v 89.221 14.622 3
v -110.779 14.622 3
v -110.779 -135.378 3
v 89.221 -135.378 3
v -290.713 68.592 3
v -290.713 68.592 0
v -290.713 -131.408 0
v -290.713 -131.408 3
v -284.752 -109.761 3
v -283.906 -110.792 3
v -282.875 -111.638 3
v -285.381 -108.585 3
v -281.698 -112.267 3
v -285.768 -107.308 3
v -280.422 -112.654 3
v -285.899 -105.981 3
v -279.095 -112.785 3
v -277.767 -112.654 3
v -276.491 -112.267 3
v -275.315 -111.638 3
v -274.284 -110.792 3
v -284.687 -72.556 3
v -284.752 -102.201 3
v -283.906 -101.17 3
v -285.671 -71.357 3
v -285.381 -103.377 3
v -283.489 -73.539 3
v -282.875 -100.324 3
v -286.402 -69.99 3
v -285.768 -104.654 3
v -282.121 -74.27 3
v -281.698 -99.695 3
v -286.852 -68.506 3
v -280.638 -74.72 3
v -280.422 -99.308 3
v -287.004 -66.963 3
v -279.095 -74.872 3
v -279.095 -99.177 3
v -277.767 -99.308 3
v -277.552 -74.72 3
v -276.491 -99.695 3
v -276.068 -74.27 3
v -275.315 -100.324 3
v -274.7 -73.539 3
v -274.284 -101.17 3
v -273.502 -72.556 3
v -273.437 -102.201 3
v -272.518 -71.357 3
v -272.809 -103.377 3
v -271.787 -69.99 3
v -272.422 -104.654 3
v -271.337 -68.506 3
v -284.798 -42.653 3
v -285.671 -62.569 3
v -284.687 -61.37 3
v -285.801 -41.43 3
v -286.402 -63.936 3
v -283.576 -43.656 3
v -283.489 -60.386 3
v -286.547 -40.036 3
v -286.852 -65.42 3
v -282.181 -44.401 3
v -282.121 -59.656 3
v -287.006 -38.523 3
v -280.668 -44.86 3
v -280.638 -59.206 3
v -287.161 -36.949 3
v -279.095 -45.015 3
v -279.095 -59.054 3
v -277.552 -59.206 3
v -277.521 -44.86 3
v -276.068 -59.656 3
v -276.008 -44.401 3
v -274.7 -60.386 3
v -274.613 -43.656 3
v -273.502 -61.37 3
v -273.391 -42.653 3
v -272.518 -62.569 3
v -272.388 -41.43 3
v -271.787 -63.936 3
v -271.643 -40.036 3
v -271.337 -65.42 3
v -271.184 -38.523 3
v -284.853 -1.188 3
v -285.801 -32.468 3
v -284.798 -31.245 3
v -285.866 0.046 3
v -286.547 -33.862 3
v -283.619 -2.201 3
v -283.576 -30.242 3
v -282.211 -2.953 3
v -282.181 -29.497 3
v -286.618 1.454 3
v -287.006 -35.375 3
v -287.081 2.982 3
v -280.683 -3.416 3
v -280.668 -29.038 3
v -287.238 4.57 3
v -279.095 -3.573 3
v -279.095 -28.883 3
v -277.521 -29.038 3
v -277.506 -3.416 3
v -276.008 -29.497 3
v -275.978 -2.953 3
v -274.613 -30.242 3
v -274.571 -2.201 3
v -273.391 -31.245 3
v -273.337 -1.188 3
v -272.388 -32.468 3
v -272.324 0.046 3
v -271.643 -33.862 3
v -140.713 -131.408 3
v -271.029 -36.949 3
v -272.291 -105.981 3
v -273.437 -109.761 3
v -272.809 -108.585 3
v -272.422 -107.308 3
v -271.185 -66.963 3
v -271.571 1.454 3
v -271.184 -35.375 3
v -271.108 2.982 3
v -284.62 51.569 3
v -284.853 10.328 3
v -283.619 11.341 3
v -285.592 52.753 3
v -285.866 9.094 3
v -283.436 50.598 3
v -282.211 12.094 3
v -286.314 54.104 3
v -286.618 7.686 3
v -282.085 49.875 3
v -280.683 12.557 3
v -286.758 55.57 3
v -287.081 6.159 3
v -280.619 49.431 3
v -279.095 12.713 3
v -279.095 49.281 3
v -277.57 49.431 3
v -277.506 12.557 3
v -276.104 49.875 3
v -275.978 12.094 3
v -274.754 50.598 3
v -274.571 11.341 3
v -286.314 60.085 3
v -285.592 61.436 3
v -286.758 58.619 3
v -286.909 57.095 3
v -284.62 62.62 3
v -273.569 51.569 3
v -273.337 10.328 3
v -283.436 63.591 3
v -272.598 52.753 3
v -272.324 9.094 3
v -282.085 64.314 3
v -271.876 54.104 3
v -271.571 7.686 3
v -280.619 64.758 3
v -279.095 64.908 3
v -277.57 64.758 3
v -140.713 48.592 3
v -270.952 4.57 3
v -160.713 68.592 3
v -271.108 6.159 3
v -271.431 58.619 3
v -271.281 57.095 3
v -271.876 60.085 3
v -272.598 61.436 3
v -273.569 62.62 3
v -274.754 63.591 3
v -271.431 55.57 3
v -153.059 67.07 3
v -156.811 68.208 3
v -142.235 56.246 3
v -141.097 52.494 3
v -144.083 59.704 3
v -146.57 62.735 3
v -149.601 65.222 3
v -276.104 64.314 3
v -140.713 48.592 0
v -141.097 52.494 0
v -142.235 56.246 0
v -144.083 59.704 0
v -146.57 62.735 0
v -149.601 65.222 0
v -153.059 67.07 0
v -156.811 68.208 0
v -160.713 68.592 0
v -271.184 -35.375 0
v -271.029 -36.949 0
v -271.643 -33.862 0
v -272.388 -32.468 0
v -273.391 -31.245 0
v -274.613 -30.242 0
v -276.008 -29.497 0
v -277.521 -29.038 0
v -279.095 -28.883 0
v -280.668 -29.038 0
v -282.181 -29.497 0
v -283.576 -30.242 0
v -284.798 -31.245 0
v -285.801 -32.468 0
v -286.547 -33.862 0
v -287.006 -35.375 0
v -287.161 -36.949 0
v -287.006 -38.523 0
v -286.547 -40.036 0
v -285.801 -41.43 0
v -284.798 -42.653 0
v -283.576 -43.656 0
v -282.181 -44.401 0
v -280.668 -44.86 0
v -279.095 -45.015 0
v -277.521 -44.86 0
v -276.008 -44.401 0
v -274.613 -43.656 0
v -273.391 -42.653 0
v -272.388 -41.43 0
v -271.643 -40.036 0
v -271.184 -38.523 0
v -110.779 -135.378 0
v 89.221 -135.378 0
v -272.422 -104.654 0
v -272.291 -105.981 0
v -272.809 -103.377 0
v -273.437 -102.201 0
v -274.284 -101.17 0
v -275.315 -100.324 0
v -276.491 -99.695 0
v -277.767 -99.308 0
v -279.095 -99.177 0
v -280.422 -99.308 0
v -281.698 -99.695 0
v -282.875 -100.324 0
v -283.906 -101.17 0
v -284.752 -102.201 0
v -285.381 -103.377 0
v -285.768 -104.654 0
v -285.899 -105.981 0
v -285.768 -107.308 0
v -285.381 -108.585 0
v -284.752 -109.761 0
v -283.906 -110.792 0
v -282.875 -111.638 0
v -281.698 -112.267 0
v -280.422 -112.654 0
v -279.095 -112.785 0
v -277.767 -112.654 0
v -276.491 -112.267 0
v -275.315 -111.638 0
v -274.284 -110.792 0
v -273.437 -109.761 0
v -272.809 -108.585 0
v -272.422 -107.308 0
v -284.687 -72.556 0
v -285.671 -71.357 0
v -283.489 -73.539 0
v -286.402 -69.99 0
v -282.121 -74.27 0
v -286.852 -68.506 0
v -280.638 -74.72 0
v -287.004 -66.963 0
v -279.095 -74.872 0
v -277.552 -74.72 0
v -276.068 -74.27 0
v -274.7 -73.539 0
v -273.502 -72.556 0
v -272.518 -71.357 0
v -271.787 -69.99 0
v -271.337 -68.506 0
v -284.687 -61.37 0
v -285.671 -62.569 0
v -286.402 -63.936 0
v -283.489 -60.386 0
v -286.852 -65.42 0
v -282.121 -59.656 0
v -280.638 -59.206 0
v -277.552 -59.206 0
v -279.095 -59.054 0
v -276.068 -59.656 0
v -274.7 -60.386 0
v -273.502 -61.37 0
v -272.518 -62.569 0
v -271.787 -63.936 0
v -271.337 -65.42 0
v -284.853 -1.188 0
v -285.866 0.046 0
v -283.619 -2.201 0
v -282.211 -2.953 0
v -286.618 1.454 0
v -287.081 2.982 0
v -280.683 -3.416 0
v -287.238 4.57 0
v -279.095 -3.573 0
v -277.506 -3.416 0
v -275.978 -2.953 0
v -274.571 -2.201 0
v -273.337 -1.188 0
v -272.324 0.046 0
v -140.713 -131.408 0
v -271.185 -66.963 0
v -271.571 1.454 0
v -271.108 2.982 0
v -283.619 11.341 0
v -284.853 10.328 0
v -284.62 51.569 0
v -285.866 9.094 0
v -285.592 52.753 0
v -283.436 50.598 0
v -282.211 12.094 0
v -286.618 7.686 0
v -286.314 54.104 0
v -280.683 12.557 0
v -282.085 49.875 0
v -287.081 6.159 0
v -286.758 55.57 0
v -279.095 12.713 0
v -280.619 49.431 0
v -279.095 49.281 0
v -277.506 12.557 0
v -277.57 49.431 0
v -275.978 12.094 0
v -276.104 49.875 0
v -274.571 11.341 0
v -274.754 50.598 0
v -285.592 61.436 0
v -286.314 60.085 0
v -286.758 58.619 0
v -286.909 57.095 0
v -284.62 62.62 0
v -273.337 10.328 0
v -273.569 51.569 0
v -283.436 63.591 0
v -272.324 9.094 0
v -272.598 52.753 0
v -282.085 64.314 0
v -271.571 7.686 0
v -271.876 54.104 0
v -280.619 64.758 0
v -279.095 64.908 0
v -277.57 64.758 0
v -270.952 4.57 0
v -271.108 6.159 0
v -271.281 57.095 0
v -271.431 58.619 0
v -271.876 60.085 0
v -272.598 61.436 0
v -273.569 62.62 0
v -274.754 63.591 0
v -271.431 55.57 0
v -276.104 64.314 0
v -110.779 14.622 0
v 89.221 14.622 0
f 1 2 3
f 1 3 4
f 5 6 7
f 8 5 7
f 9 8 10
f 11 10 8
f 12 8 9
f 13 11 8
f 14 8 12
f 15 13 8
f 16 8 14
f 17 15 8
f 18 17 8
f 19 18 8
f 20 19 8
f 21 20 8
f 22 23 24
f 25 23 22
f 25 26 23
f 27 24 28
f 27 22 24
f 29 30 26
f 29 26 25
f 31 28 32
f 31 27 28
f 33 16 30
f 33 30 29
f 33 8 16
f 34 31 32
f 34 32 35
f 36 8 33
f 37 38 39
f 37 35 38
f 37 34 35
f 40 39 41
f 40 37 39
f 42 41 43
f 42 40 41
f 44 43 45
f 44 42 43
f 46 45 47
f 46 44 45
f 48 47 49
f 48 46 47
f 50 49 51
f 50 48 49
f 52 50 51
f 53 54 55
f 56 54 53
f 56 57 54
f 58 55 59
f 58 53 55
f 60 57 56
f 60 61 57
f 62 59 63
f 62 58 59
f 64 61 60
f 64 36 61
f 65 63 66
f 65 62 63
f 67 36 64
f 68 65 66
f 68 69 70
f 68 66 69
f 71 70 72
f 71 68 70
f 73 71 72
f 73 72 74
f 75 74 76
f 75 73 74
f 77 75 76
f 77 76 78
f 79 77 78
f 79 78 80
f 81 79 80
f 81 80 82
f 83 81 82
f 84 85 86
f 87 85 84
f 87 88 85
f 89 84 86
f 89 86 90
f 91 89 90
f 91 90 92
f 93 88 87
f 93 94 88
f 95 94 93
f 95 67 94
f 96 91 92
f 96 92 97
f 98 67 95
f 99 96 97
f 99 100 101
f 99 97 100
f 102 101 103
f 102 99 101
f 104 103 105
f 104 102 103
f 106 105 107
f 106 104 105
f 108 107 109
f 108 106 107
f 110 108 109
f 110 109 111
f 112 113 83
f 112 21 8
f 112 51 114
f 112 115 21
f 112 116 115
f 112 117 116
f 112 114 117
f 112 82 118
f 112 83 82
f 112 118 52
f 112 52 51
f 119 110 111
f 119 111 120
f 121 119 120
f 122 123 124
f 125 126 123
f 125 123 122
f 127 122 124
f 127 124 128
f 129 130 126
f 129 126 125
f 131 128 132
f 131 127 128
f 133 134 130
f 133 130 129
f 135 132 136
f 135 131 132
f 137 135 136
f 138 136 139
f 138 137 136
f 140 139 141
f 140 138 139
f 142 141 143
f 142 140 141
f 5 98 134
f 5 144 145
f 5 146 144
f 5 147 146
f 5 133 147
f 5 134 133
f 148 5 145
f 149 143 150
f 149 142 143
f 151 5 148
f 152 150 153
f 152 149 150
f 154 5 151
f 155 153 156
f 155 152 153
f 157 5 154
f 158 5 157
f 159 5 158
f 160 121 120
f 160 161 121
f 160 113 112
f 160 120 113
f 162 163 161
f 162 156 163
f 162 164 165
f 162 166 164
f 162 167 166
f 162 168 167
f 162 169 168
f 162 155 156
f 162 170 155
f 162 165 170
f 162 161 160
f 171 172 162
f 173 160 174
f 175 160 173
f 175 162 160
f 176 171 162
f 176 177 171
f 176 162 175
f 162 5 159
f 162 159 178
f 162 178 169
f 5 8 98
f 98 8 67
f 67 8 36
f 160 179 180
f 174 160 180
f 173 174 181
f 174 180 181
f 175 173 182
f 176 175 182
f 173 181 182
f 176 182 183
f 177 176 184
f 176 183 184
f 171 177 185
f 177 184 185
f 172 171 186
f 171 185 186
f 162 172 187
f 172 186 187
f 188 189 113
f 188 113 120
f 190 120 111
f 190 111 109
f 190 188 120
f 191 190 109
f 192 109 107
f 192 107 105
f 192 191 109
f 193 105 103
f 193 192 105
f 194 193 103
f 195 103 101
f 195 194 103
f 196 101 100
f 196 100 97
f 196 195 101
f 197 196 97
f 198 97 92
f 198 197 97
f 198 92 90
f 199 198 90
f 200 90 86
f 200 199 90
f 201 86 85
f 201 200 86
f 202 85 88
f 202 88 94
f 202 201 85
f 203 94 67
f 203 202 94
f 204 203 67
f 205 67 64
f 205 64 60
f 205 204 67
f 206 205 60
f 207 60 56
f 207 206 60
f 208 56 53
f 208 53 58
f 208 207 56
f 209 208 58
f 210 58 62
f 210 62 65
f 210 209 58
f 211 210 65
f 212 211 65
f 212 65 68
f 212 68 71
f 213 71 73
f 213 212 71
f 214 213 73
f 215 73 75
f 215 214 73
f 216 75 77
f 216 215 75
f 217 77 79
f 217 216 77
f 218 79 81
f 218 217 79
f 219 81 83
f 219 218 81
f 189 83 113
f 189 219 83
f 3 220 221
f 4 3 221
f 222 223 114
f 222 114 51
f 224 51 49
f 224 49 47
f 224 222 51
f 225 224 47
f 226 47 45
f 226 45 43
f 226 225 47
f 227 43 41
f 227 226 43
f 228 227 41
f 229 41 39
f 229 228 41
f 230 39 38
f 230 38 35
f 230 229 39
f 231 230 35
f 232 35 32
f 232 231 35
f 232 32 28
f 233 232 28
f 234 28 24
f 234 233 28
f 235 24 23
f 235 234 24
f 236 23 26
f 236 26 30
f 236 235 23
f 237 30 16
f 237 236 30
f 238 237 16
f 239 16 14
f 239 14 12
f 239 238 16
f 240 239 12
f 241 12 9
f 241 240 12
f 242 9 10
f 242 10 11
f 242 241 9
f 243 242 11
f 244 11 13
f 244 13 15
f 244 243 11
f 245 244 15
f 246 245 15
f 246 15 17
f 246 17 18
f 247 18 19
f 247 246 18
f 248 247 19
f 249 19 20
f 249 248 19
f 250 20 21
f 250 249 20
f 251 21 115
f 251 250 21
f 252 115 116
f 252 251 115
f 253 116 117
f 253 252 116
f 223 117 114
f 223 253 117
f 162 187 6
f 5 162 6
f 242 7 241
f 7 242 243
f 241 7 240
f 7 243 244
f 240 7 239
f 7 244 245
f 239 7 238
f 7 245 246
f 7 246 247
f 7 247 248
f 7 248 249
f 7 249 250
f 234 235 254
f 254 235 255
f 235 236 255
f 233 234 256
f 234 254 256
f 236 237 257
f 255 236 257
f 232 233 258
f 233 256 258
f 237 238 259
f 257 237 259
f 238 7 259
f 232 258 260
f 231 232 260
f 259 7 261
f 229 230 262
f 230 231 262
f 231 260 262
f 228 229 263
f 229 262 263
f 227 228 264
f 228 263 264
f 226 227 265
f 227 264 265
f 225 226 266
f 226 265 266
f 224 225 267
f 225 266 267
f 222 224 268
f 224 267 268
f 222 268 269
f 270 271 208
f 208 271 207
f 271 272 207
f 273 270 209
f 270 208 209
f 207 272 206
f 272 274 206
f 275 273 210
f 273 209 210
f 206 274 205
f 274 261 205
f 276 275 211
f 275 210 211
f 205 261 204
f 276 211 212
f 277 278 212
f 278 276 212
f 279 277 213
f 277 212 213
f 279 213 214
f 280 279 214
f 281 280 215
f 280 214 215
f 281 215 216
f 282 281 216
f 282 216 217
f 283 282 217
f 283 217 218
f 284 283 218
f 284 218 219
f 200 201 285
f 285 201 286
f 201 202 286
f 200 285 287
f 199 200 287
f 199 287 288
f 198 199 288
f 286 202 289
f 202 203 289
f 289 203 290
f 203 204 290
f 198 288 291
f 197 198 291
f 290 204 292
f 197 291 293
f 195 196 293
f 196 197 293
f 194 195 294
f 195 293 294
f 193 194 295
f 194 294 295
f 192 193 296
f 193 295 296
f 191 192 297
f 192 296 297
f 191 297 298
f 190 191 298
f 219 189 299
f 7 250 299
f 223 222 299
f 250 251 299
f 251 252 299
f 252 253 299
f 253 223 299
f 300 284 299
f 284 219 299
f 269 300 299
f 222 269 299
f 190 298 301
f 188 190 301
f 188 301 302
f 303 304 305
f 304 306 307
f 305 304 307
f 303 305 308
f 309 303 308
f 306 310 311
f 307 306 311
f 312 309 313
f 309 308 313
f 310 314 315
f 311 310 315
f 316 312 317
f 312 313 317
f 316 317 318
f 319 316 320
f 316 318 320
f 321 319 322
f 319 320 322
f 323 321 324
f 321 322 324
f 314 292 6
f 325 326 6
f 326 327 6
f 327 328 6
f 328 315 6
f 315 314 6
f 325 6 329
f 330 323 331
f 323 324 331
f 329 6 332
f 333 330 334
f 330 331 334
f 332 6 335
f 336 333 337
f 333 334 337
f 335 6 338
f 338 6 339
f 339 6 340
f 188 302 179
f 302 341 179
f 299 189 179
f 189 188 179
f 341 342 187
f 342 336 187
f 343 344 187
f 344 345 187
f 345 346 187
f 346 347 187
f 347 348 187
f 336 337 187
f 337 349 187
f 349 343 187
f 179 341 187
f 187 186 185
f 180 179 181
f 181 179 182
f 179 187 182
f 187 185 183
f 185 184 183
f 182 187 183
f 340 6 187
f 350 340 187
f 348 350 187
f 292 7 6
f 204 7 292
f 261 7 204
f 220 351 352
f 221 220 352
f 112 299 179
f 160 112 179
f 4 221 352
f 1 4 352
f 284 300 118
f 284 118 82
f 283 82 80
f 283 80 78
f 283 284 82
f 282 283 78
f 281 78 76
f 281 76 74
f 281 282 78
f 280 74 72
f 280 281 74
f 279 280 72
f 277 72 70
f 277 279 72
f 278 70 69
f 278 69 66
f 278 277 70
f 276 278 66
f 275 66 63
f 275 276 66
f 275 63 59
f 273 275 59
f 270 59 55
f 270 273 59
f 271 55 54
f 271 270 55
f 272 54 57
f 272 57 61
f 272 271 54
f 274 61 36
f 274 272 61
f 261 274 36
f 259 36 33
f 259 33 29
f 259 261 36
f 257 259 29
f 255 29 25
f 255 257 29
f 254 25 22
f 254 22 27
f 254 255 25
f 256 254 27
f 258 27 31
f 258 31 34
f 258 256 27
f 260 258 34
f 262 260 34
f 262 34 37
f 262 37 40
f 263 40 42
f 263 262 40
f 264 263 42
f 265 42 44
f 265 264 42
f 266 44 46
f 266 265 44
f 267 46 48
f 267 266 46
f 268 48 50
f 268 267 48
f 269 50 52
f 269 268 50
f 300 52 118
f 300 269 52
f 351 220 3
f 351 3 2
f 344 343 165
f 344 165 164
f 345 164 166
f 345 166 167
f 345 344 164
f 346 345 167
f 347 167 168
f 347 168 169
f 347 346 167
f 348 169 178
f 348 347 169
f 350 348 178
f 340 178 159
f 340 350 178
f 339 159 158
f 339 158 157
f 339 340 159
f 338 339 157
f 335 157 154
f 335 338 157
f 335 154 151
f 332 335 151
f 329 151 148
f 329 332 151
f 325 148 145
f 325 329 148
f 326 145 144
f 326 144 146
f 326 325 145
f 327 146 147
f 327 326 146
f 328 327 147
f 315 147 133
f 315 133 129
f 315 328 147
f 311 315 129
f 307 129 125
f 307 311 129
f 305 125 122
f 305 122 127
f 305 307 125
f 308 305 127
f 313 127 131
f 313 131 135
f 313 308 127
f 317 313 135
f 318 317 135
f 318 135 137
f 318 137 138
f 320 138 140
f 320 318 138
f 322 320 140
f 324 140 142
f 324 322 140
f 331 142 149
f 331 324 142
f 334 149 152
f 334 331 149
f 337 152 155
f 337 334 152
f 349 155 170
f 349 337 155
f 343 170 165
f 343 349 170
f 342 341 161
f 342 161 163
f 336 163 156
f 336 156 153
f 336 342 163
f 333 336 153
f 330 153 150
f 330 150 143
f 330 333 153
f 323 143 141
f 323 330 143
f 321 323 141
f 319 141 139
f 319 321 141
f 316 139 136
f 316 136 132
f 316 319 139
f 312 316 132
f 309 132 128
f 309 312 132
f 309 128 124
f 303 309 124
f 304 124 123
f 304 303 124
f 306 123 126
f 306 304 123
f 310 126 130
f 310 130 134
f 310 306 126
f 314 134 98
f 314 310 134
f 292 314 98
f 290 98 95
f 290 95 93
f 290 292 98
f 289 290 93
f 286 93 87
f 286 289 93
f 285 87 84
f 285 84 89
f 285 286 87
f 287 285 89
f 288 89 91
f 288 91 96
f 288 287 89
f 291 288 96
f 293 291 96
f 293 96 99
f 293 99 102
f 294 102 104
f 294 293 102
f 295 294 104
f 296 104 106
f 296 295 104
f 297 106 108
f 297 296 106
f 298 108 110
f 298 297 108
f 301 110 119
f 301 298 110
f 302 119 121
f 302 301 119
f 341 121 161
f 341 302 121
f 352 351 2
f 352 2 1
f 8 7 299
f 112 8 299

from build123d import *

# Parameters (mm, degrees)
F0_W     = 200
F0_H     = 150
F0_R     = 6.803891
F0_R_2   = 7.909356
F0_R_3   = 8.065977
F0_R_4   = 8.143178
F0_R_5   = 7.813851
F1_DEPTH = 3


with BuildPart() as f1:
    # F0 (on Top) → F1 (new body)
    with BuildSketch(Plane.XY):
        with Locations((-10.779469, -60.377909)):
            Rectangle(F0_W, F0_H)
        with BuildLine():
            Line((-160.71261, 68.592381), (-290.71261, 68.592381))
            Line((-290.71261, 68.592381), (-290.71261, -131.407619))
            Line((-290.71261, -131.407619), (-140.71261, -131.407619))
            Line((-140.71261, -131.407619), (-140.71261, 48.592381))
            ThreePointArc((-140.71261, 48.592381), (-146.570475, 62.734517), (-160.71261, 68.592381))
        make_face()
        with Locations((-279.094696, -105.980933)):
            Circle(F0_R, mode=Mode.SUBTRACT)
        with Locations((-279.094696, -66.962883)):
            Circle(F0_R_2, mode=Mode.SUBTRACT)
        with Locations((-279.094696, -36.948998)):
            Circle(F0_R_3, mode=Mode.SUBTRACT)
        with Locations((-279.094696, 4.570211)):
            Circle(F0_R_4, mode=Mode.SUBTRACT)
        with Locations((-279.094696, 57.094514)):
            Circle(F0_R_5, mode=Mode.SUBTRACT)
    extrude(amount=F1_DEPTH)


solid = f1.part
